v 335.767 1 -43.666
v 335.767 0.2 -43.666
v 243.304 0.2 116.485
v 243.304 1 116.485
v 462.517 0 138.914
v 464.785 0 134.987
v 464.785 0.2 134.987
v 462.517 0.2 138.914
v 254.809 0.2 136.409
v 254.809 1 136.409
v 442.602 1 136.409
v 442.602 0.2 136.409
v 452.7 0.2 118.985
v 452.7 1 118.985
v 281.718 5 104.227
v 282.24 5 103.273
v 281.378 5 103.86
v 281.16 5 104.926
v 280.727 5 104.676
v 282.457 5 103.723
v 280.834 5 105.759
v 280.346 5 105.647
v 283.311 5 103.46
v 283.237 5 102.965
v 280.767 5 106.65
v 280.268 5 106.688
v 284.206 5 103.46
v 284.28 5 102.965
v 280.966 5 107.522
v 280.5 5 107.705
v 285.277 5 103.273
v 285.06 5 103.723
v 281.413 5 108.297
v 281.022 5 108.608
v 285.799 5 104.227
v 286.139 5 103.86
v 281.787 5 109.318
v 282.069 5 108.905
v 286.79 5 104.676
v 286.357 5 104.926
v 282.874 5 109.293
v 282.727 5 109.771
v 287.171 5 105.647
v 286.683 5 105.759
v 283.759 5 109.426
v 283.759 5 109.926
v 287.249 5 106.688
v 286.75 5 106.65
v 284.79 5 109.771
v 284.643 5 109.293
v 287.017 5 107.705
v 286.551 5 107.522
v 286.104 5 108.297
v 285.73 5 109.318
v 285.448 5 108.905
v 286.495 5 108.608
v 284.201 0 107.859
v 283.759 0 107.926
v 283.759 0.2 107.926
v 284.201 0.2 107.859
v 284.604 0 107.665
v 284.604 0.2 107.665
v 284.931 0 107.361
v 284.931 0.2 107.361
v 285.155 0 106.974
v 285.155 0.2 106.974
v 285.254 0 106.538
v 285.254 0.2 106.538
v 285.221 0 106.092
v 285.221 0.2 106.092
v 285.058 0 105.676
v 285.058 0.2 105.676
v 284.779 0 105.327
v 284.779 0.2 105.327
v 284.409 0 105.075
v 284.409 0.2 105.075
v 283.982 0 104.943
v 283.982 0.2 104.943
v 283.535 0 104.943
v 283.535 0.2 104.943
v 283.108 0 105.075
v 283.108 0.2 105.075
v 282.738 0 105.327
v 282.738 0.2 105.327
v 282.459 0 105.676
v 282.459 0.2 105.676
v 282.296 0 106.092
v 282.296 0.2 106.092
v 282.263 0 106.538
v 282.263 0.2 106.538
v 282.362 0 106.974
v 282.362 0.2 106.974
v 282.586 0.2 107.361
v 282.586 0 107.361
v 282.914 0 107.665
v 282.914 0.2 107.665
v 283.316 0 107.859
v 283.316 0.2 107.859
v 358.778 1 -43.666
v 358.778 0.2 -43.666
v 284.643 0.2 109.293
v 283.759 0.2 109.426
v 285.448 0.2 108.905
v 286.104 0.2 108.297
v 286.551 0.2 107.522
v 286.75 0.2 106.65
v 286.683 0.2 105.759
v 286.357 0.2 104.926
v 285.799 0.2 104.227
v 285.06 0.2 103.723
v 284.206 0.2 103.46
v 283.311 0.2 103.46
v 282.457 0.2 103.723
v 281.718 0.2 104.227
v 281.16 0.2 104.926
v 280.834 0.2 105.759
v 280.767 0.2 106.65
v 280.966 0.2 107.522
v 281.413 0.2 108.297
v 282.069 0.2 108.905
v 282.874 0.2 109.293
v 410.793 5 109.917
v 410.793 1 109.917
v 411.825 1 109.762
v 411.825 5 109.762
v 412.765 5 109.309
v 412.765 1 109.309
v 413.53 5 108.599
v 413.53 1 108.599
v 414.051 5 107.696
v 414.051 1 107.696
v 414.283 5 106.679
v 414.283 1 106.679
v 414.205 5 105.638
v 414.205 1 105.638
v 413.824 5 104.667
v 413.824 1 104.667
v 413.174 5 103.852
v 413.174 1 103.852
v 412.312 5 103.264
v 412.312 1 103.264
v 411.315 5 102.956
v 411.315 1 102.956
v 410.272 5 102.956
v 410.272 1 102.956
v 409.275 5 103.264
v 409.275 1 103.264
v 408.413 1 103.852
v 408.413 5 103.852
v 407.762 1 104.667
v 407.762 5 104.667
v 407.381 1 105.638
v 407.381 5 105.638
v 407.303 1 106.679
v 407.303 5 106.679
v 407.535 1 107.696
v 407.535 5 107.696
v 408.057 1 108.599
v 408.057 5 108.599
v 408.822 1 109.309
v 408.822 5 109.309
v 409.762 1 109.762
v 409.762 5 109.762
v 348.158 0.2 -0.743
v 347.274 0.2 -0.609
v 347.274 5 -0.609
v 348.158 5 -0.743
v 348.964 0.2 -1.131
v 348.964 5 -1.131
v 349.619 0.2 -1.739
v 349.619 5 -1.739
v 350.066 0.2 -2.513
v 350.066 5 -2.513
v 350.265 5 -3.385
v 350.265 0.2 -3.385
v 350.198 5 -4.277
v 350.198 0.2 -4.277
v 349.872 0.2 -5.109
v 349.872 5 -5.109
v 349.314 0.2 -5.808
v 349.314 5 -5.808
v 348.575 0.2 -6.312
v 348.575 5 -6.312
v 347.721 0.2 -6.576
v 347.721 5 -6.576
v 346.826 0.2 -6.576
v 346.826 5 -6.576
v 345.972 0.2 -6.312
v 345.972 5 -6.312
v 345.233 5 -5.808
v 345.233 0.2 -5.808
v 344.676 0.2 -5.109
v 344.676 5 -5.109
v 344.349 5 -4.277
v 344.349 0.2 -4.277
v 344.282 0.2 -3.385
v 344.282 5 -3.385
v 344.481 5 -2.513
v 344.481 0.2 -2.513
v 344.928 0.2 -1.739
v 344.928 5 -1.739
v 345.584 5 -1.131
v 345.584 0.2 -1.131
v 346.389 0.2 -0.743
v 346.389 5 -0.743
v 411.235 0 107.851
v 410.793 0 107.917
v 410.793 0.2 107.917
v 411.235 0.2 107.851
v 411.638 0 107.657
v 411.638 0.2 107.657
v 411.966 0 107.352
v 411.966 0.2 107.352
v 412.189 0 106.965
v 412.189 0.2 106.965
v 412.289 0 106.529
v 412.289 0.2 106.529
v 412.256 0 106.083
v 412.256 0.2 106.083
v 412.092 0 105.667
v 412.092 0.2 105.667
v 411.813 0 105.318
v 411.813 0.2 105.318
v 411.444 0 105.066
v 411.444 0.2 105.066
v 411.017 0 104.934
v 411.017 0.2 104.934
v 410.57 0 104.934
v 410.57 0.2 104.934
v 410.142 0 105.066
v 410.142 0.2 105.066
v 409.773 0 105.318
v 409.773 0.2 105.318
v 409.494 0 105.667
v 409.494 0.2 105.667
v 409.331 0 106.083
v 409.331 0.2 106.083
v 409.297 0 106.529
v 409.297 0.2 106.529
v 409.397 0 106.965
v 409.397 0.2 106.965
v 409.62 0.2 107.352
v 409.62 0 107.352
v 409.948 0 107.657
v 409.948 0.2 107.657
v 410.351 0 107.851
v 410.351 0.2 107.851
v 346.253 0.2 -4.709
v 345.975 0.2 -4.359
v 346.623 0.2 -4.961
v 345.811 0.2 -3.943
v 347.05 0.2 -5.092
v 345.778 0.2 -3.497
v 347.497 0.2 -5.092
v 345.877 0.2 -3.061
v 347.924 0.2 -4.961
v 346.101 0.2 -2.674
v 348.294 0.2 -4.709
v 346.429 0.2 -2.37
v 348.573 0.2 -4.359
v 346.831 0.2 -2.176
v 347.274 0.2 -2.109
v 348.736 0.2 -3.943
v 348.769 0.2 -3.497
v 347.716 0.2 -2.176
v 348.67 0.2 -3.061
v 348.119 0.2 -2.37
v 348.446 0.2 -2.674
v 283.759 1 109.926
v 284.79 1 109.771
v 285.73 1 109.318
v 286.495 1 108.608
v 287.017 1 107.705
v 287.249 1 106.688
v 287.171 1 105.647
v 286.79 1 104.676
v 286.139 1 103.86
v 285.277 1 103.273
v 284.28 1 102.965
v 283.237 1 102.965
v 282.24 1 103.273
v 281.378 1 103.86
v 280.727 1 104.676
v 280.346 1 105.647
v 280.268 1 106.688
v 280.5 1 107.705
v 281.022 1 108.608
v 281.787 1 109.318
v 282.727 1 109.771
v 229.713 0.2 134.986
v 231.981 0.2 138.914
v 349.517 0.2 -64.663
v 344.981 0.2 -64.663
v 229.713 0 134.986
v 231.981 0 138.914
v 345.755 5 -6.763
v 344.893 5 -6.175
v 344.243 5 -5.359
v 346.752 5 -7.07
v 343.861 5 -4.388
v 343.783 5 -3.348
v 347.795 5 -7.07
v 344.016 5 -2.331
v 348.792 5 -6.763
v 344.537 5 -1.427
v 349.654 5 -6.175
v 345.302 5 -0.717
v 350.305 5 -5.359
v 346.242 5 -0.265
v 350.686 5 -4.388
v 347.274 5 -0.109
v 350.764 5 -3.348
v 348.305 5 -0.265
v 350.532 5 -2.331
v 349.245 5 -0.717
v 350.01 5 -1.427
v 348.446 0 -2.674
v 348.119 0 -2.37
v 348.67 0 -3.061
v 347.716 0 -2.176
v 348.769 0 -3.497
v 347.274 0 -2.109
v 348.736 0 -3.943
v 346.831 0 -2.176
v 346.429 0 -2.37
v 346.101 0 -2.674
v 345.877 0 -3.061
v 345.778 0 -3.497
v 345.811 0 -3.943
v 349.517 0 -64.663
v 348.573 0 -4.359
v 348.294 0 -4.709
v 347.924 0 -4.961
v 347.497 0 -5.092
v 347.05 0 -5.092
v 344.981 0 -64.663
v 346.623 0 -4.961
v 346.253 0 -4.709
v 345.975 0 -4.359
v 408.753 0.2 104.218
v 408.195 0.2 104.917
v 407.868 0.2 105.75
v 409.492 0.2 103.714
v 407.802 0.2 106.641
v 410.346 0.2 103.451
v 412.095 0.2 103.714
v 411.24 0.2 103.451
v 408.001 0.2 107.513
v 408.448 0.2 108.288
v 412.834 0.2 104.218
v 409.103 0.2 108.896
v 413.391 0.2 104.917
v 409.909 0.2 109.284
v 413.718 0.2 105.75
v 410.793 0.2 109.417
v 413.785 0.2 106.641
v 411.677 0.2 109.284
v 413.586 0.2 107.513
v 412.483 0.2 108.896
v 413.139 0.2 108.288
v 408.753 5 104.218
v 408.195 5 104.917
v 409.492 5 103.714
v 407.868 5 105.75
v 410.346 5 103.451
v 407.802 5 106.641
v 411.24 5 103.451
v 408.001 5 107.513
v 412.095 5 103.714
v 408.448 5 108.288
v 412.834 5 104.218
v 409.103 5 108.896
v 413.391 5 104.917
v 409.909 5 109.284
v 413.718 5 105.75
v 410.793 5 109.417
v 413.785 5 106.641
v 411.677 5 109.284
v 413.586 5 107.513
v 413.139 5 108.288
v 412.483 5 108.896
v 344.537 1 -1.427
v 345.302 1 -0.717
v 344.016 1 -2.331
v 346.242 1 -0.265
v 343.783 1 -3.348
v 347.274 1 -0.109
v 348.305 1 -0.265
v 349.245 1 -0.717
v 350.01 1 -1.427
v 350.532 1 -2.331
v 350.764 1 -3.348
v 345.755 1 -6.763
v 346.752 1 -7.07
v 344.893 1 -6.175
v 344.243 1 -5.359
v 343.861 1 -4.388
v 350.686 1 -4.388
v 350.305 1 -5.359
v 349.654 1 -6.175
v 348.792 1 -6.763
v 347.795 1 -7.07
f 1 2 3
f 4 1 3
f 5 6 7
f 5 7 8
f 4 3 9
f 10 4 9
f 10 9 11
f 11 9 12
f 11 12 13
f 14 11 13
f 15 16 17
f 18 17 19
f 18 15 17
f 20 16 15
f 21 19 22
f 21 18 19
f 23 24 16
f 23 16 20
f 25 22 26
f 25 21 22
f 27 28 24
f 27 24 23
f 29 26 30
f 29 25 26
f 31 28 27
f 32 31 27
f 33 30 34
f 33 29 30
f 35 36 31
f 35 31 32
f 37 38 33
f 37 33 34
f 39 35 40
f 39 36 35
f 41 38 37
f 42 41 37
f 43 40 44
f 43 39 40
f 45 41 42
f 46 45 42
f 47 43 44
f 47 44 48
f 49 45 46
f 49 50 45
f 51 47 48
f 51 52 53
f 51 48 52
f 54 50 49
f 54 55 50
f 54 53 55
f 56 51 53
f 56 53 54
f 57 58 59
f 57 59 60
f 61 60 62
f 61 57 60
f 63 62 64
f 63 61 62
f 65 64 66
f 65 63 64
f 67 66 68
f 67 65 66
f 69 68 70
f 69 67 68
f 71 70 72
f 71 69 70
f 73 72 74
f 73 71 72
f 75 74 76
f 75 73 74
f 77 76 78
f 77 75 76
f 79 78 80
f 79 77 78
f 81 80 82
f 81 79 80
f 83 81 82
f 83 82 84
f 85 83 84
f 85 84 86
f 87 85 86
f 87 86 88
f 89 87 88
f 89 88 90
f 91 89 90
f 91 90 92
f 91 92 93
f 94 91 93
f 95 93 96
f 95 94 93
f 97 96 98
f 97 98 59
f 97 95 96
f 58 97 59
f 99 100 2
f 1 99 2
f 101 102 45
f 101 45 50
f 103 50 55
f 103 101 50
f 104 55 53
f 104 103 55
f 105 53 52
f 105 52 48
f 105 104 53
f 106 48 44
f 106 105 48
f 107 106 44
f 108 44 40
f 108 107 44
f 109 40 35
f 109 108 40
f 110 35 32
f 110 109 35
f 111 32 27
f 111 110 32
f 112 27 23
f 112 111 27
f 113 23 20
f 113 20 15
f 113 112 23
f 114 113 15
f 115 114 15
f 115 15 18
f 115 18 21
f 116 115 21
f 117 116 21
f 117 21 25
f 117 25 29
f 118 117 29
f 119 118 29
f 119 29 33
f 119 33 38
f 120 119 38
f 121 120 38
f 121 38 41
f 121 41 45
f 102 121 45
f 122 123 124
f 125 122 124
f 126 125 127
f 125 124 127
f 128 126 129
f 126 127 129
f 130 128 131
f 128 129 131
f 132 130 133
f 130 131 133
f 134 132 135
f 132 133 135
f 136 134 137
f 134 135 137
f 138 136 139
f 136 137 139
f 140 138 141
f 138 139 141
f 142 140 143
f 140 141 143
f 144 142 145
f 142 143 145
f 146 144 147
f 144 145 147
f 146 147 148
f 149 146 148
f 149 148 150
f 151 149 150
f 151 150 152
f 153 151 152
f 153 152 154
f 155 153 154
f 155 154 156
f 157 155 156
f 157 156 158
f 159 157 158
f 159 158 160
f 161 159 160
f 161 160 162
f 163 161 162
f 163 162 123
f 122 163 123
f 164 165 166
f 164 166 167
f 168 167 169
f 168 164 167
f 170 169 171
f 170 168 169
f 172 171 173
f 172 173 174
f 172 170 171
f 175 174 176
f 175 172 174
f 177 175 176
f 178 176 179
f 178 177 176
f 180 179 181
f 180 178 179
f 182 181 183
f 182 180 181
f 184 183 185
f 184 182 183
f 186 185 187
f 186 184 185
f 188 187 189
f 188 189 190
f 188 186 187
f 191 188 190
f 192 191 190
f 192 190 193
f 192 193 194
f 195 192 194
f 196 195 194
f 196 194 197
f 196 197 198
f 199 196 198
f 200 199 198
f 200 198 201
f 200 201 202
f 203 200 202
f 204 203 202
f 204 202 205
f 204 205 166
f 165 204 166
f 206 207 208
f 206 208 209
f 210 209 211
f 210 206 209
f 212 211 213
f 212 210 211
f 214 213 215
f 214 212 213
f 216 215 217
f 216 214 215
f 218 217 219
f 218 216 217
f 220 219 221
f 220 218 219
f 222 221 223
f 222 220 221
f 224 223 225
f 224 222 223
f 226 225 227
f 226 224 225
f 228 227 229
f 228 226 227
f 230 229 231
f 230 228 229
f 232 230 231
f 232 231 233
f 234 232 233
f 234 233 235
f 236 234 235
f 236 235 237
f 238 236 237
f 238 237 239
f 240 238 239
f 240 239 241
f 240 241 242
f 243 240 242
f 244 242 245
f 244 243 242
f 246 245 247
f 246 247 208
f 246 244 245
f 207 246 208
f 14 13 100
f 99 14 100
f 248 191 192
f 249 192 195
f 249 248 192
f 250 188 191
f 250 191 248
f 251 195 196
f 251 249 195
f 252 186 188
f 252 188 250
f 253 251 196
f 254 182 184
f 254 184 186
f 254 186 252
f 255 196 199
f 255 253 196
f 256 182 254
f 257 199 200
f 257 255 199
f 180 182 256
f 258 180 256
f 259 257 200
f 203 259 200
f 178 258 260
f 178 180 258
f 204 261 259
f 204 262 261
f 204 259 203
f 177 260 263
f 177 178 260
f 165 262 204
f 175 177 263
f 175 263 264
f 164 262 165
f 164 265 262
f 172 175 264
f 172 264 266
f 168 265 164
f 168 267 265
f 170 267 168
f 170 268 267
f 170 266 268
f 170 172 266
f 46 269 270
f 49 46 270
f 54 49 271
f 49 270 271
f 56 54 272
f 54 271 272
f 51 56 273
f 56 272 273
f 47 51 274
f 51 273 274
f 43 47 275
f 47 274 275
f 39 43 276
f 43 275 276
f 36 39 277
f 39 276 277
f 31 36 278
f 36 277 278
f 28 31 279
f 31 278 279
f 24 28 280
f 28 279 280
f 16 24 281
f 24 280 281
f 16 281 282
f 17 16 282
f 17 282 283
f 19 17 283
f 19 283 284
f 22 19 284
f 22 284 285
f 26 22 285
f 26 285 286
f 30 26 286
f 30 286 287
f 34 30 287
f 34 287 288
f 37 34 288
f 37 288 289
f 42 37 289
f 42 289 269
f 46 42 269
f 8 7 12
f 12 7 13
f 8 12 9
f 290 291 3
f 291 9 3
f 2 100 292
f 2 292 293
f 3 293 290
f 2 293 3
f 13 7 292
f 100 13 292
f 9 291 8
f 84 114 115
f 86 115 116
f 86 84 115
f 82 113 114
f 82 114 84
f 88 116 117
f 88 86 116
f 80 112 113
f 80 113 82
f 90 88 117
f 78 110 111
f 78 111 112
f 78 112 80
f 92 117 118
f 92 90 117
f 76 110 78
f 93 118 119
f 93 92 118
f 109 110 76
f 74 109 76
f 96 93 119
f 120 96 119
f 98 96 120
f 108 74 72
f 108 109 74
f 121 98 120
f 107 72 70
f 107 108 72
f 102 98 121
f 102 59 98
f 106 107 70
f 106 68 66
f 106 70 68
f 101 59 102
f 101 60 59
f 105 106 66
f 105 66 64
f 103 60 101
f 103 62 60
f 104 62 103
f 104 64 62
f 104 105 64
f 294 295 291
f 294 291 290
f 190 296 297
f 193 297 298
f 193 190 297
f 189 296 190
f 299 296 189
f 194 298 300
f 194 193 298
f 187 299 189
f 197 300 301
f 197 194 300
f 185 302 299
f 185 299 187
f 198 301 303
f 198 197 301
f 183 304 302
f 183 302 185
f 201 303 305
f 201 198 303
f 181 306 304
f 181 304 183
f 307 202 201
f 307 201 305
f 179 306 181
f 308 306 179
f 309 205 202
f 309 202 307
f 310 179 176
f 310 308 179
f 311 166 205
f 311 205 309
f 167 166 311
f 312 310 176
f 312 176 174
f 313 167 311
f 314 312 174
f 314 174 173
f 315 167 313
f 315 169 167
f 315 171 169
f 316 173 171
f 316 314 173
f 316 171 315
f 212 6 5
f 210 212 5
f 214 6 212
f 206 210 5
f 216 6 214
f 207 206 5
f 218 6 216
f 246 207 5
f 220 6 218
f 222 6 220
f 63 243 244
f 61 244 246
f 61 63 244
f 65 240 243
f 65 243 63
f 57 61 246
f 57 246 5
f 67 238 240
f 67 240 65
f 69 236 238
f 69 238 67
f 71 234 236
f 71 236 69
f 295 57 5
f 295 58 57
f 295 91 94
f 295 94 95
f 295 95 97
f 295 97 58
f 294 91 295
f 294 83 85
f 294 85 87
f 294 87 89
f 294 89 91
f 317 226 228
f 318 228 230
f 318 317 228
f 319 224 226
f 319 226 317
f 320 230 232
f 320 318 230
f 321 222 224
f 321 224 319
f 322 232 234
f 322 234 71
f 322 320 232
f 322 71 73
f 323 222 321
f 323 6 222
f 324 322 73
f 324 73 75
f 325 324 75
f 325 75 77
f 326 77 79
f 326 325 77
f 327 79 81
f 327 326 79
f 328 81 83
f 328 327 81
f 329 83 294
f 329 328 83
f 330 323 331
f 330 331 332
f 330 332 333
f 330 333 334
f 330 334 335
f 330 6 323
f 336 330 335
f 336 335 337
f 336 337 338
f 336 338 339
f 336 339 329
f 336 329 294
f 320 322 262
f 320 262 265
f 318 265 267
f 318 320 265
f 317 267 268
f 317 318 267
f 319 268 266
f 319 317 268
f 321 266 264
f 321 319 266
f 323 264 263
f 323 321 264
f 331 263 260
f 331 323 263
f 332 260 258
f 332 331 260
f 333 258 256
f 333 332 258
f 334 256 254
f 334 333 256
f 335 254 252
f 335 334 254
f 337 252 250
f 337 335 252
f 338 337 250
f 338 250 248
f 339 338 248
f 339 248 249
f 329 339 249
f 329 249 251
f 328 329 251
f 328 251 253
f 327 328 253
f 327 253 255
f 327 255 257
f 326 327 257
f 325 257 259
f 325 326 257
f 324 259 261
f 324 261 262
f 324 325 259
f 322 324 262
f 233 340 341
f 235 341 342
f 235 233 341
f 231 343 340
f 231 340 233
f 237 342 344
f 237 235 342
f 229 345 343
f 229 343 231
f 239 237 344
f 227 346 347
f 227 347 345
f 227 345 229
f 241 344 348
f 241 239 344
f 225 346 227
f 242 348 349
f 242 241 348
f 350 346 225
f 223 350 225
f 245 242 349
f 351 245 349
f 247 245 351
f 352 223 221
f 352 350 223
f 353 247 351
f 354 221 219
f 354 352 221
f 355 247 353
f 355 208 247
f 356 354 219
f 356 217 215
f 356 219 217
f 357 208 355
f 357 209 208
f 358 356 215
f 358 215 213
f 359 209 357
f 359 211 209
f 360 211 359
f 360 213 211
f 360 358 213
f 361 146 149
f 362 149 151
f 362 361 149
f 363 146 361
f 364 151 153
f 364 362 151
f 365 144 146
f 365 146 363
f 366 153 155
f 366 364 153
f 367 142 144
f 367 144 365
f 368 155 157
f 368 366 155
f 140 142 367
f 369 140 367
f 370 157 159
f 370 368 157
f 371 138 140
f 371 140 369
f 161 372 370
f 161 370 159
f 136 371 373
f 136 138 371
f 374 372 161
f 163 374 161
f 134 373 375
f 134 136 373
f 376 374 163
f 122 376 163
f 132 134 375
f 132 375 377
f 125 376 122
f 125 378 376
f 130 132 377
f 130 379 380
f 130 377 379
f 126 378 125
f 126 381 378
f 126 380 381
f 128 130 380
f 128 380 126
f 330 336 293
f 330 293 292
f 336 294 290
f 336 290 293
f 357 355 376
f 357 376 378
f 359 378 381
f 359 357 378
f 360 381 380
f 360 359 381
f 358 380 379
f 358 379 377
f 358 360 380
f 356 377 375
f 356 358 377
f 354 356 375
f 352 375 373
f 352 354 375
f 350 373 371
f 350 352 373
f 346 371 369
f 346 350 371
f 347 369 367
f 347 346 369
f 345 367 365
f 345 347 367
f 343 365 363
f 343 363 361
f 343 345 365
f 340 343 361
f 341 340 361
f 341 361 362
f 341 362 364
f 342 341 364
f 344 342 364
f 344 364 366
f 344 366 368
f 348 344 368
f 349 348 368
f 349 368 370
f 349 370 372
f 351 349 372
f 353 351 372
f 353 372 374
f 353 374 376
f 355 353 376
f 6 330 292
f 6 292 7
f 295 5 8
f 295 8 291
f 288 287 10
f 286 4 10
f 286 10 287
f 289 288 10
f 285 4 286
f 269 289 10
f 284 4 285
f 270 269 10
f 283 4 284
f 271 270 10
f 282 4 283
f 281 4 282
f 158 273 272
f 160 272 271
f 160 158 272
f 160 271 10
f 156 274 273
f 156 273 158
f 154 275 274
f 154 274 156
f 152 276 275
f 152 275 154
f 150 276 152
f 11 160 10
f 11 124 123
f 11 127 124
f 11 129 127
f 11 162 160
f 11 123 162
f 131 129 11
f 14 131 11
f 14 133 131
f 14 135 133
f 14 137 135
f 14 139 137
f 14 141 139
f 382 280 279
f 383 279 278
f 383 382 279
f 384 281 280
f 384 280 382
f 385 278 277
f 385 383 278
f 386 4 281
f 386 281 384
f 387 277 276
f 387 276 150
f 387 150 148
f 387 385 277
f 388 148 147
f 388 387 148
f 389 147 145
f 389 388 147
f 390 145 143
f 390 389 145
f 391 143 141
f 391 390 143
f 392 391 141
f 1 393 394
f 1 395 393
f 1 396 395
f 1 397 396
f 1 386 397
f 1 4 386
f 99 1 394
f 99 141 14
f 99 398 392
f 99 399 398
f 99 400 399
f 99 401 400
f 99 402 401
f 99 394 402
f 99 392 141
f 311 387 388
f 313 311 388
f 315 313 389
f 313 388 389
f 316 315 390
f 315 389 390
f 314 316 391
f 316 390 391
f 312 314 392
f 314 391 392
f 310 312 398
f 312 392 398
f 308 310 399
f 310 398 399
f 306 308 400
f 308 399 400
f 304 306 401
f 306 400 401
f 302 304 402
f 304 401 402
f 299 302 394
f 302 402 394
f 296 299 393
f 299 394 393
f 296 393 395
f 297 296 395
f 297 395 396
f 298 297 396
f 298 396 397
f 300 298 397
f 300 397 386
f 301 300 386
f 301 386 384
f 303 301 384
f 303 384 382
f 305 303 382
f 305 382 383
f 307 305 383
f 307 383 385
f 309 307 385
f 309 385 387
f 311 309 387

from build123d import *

# Parameters (mm, degrees)
SKETCH1_R             = 3
SKETCH1_R_2           = 1.5
BOSS_EXTRUDE1_DEPTH   = 0.2
BOSS_EXTRUDE1_2_DEPTH = 0.2
BOSS_EXTRUDE1_3_DEPTH = 0.2
BOSS_EXTRUDE1_4_DEPTH = 0.2
SKETCH1_14_R          = 3.5
BOSS_EXTRUDE2_DEPTH   = 1
SKETCH1_17_R          = 3.5
SKETCH1_17_R_2        = 3
BOSS_EXTRUDE4_DEPTH   = 5


with BuildPart() as part:
    # Sketch1 → Boss-Extrude1 (new body)
    with BuildSketch(Plane(origin=(0, 0, 0), x_dir=(1, 0, 0), z_dir=(0, 1, 0))):
        with Locations((347.273609729, 3.609230825)):
            Circle(SKETCH1_R)
        with Locations((347.273609729, 3.609230825)):
            Circle(SKETCH1_R_2, mode=Mode.SUBTRACT)
    extrude(amount=BOSS_EXTRUDE1_DEPTH)



with BuildPart() as body_2:
    # Sketch1 → Boss-Extrude1 2 (new body)
    with BuildSketch(Plane(origin=(0, 0, 0), x_dir=(1, 0, 0), z_dir=(0, 1, 0))):
        with Locations((410.793152563, -106.417182487)):
            Circle(SKETCH1_R)
        with Locations((410.793152563, -106.417182487)):
            Circle(SKETCH1_R_2, mode=Mode.SUBTRACT)
    extrude(amount=BOSS_EXTRUDE1_2_DEPTH)


with BuildPart() as body_3:
    # Sketch1 → Boss-Extrude1 3 (new body)
    with BuildSketch(Plane(origin=(0, 0, 0), x_dir=(1, 0, 0), z_dir=(0, 1, 0))):
        with Locations((283.758521159, -106.426112565)):
            Circle(SKETCH1_R)
        with Locations((283.758521159, -106.426112565)):
            Circle(SKETCH1_R_2, mode=Mode.SUBTRACT)
    extrude(amount=BOSS_EXTRUDE1_3_DEPTH)


with BuildPart() as body_4:
    # Sketch1 → Boss-Extrude1 4 (new body)
    with BuildSketch(Plane(origin=(0, 0, 0), x_dir=(1, 0, 0), z_dir=(0, 1, 0))):
        Polygon((231.981171214, -138.914415757), (229.712705007, -134.986323544), (344.980692969, 64.663360453), (349.516789508, 64.663360453), (464.784783451, -134.986661544), (462.517056767, -138.914415757), align=None)
        Polygon((243.304219773, -116.484791866), (254.809280576, -136.408896139), (442.602090749, -136.409305398), (452.699916625, -118.984688015), (358.778179035, 43.666038066), (335.767496284, 43.666038066), align=None, mode=Mode.SUBTRACT)
    extrude(amount=BOSS_EXTRUDE1_4_DEPTH)

    # Sketch1<14> → Boss-Extrude2 (add)
    with BuildSketch(Plane(origin=(0, 0, 0), x_dir=(1, 0, 0), z_dir=(0, 1, 0))):
        Polygon((335.767496284, 43.666038066), (243.304219773, -116.484791866), (254.809280576, -136.408896139), (442.602090749, -136.409305398), (452.699916625, -118.984688015), (358.778179035, 43.666038066), align=None)
        with Locations((283.758521159, -106.426112565)):
            Circle(SKETCH1_14_R, mode=Mode.SUBTRACT)
        with Locations((410.793152563, -106.417182487)):
            Circle(SKETCH1_14_R, mode=Mode.SUBTRACT)
        with Locations((347.273609729, 3.609230825)):
            Circle(SKETCH1_14_R, mode=Mode.SUBTRACT)
    extrude(amount=BOSS_EXTRUDE2_DEPTH)


with BuildPart() as part_1:
    add(part.part)

    add(body_2.part)  # Boss-Extrude4 merges body 2

    add(body_3.part)  # Boss-Extrude4 merges body 3

    add(body_4.part)  # Boss-Extrude4 merges body 4
    # Sketch1<17> → Boss-Extrude4 (add)
    # profile 1 of 3: a face of its own
    with BuildSketch(Plane(origin=(0, 0, 0), x_dir=(1, 0, 0), z_dir=(0, 1, 0))):
        with Locations((347.273609729, 3.609230825)):
            Circle(SKETCH1_17_R)
        with Locations((347.273609729, 3.609230825)):
            Circle(SKETCH1_17_R_2, mode=Mode.SUBTRACT)
    # profile 2 of 3: a face of its own
    with BuildSketch(Plane(origin=(0, 0, 0), x_dir=(1, 0, 0), z_dir=(0, 1, 0))):
        with Locations((410.793152563, -106.417182487)):
            Circle(SKETCH1_17_R)
        with Locations((410.793152563, -106.417182487)):
            Circle(SKETCH1_17_R_2, mode=Mode.SUBTRACT)
    # profile 3 of 3: a face of its own
    with BuildSketch(Plane(origin=(0, 0, 0), x_dir=(1, 0, 0), z_dir=(0, 1, 0))):
        with Locations((283.758521159, -106.426112565)):
            Circle(SKETCH1_17_R)
        with Locations((283.758521159, -106.426112565)):
            Circle(SKETCH1_17_R_2, mode=Mode.SUBTRACT)
    extrude(amount=BOSS_EXTRUDE4_DEPTH)


solid = part_1.part
